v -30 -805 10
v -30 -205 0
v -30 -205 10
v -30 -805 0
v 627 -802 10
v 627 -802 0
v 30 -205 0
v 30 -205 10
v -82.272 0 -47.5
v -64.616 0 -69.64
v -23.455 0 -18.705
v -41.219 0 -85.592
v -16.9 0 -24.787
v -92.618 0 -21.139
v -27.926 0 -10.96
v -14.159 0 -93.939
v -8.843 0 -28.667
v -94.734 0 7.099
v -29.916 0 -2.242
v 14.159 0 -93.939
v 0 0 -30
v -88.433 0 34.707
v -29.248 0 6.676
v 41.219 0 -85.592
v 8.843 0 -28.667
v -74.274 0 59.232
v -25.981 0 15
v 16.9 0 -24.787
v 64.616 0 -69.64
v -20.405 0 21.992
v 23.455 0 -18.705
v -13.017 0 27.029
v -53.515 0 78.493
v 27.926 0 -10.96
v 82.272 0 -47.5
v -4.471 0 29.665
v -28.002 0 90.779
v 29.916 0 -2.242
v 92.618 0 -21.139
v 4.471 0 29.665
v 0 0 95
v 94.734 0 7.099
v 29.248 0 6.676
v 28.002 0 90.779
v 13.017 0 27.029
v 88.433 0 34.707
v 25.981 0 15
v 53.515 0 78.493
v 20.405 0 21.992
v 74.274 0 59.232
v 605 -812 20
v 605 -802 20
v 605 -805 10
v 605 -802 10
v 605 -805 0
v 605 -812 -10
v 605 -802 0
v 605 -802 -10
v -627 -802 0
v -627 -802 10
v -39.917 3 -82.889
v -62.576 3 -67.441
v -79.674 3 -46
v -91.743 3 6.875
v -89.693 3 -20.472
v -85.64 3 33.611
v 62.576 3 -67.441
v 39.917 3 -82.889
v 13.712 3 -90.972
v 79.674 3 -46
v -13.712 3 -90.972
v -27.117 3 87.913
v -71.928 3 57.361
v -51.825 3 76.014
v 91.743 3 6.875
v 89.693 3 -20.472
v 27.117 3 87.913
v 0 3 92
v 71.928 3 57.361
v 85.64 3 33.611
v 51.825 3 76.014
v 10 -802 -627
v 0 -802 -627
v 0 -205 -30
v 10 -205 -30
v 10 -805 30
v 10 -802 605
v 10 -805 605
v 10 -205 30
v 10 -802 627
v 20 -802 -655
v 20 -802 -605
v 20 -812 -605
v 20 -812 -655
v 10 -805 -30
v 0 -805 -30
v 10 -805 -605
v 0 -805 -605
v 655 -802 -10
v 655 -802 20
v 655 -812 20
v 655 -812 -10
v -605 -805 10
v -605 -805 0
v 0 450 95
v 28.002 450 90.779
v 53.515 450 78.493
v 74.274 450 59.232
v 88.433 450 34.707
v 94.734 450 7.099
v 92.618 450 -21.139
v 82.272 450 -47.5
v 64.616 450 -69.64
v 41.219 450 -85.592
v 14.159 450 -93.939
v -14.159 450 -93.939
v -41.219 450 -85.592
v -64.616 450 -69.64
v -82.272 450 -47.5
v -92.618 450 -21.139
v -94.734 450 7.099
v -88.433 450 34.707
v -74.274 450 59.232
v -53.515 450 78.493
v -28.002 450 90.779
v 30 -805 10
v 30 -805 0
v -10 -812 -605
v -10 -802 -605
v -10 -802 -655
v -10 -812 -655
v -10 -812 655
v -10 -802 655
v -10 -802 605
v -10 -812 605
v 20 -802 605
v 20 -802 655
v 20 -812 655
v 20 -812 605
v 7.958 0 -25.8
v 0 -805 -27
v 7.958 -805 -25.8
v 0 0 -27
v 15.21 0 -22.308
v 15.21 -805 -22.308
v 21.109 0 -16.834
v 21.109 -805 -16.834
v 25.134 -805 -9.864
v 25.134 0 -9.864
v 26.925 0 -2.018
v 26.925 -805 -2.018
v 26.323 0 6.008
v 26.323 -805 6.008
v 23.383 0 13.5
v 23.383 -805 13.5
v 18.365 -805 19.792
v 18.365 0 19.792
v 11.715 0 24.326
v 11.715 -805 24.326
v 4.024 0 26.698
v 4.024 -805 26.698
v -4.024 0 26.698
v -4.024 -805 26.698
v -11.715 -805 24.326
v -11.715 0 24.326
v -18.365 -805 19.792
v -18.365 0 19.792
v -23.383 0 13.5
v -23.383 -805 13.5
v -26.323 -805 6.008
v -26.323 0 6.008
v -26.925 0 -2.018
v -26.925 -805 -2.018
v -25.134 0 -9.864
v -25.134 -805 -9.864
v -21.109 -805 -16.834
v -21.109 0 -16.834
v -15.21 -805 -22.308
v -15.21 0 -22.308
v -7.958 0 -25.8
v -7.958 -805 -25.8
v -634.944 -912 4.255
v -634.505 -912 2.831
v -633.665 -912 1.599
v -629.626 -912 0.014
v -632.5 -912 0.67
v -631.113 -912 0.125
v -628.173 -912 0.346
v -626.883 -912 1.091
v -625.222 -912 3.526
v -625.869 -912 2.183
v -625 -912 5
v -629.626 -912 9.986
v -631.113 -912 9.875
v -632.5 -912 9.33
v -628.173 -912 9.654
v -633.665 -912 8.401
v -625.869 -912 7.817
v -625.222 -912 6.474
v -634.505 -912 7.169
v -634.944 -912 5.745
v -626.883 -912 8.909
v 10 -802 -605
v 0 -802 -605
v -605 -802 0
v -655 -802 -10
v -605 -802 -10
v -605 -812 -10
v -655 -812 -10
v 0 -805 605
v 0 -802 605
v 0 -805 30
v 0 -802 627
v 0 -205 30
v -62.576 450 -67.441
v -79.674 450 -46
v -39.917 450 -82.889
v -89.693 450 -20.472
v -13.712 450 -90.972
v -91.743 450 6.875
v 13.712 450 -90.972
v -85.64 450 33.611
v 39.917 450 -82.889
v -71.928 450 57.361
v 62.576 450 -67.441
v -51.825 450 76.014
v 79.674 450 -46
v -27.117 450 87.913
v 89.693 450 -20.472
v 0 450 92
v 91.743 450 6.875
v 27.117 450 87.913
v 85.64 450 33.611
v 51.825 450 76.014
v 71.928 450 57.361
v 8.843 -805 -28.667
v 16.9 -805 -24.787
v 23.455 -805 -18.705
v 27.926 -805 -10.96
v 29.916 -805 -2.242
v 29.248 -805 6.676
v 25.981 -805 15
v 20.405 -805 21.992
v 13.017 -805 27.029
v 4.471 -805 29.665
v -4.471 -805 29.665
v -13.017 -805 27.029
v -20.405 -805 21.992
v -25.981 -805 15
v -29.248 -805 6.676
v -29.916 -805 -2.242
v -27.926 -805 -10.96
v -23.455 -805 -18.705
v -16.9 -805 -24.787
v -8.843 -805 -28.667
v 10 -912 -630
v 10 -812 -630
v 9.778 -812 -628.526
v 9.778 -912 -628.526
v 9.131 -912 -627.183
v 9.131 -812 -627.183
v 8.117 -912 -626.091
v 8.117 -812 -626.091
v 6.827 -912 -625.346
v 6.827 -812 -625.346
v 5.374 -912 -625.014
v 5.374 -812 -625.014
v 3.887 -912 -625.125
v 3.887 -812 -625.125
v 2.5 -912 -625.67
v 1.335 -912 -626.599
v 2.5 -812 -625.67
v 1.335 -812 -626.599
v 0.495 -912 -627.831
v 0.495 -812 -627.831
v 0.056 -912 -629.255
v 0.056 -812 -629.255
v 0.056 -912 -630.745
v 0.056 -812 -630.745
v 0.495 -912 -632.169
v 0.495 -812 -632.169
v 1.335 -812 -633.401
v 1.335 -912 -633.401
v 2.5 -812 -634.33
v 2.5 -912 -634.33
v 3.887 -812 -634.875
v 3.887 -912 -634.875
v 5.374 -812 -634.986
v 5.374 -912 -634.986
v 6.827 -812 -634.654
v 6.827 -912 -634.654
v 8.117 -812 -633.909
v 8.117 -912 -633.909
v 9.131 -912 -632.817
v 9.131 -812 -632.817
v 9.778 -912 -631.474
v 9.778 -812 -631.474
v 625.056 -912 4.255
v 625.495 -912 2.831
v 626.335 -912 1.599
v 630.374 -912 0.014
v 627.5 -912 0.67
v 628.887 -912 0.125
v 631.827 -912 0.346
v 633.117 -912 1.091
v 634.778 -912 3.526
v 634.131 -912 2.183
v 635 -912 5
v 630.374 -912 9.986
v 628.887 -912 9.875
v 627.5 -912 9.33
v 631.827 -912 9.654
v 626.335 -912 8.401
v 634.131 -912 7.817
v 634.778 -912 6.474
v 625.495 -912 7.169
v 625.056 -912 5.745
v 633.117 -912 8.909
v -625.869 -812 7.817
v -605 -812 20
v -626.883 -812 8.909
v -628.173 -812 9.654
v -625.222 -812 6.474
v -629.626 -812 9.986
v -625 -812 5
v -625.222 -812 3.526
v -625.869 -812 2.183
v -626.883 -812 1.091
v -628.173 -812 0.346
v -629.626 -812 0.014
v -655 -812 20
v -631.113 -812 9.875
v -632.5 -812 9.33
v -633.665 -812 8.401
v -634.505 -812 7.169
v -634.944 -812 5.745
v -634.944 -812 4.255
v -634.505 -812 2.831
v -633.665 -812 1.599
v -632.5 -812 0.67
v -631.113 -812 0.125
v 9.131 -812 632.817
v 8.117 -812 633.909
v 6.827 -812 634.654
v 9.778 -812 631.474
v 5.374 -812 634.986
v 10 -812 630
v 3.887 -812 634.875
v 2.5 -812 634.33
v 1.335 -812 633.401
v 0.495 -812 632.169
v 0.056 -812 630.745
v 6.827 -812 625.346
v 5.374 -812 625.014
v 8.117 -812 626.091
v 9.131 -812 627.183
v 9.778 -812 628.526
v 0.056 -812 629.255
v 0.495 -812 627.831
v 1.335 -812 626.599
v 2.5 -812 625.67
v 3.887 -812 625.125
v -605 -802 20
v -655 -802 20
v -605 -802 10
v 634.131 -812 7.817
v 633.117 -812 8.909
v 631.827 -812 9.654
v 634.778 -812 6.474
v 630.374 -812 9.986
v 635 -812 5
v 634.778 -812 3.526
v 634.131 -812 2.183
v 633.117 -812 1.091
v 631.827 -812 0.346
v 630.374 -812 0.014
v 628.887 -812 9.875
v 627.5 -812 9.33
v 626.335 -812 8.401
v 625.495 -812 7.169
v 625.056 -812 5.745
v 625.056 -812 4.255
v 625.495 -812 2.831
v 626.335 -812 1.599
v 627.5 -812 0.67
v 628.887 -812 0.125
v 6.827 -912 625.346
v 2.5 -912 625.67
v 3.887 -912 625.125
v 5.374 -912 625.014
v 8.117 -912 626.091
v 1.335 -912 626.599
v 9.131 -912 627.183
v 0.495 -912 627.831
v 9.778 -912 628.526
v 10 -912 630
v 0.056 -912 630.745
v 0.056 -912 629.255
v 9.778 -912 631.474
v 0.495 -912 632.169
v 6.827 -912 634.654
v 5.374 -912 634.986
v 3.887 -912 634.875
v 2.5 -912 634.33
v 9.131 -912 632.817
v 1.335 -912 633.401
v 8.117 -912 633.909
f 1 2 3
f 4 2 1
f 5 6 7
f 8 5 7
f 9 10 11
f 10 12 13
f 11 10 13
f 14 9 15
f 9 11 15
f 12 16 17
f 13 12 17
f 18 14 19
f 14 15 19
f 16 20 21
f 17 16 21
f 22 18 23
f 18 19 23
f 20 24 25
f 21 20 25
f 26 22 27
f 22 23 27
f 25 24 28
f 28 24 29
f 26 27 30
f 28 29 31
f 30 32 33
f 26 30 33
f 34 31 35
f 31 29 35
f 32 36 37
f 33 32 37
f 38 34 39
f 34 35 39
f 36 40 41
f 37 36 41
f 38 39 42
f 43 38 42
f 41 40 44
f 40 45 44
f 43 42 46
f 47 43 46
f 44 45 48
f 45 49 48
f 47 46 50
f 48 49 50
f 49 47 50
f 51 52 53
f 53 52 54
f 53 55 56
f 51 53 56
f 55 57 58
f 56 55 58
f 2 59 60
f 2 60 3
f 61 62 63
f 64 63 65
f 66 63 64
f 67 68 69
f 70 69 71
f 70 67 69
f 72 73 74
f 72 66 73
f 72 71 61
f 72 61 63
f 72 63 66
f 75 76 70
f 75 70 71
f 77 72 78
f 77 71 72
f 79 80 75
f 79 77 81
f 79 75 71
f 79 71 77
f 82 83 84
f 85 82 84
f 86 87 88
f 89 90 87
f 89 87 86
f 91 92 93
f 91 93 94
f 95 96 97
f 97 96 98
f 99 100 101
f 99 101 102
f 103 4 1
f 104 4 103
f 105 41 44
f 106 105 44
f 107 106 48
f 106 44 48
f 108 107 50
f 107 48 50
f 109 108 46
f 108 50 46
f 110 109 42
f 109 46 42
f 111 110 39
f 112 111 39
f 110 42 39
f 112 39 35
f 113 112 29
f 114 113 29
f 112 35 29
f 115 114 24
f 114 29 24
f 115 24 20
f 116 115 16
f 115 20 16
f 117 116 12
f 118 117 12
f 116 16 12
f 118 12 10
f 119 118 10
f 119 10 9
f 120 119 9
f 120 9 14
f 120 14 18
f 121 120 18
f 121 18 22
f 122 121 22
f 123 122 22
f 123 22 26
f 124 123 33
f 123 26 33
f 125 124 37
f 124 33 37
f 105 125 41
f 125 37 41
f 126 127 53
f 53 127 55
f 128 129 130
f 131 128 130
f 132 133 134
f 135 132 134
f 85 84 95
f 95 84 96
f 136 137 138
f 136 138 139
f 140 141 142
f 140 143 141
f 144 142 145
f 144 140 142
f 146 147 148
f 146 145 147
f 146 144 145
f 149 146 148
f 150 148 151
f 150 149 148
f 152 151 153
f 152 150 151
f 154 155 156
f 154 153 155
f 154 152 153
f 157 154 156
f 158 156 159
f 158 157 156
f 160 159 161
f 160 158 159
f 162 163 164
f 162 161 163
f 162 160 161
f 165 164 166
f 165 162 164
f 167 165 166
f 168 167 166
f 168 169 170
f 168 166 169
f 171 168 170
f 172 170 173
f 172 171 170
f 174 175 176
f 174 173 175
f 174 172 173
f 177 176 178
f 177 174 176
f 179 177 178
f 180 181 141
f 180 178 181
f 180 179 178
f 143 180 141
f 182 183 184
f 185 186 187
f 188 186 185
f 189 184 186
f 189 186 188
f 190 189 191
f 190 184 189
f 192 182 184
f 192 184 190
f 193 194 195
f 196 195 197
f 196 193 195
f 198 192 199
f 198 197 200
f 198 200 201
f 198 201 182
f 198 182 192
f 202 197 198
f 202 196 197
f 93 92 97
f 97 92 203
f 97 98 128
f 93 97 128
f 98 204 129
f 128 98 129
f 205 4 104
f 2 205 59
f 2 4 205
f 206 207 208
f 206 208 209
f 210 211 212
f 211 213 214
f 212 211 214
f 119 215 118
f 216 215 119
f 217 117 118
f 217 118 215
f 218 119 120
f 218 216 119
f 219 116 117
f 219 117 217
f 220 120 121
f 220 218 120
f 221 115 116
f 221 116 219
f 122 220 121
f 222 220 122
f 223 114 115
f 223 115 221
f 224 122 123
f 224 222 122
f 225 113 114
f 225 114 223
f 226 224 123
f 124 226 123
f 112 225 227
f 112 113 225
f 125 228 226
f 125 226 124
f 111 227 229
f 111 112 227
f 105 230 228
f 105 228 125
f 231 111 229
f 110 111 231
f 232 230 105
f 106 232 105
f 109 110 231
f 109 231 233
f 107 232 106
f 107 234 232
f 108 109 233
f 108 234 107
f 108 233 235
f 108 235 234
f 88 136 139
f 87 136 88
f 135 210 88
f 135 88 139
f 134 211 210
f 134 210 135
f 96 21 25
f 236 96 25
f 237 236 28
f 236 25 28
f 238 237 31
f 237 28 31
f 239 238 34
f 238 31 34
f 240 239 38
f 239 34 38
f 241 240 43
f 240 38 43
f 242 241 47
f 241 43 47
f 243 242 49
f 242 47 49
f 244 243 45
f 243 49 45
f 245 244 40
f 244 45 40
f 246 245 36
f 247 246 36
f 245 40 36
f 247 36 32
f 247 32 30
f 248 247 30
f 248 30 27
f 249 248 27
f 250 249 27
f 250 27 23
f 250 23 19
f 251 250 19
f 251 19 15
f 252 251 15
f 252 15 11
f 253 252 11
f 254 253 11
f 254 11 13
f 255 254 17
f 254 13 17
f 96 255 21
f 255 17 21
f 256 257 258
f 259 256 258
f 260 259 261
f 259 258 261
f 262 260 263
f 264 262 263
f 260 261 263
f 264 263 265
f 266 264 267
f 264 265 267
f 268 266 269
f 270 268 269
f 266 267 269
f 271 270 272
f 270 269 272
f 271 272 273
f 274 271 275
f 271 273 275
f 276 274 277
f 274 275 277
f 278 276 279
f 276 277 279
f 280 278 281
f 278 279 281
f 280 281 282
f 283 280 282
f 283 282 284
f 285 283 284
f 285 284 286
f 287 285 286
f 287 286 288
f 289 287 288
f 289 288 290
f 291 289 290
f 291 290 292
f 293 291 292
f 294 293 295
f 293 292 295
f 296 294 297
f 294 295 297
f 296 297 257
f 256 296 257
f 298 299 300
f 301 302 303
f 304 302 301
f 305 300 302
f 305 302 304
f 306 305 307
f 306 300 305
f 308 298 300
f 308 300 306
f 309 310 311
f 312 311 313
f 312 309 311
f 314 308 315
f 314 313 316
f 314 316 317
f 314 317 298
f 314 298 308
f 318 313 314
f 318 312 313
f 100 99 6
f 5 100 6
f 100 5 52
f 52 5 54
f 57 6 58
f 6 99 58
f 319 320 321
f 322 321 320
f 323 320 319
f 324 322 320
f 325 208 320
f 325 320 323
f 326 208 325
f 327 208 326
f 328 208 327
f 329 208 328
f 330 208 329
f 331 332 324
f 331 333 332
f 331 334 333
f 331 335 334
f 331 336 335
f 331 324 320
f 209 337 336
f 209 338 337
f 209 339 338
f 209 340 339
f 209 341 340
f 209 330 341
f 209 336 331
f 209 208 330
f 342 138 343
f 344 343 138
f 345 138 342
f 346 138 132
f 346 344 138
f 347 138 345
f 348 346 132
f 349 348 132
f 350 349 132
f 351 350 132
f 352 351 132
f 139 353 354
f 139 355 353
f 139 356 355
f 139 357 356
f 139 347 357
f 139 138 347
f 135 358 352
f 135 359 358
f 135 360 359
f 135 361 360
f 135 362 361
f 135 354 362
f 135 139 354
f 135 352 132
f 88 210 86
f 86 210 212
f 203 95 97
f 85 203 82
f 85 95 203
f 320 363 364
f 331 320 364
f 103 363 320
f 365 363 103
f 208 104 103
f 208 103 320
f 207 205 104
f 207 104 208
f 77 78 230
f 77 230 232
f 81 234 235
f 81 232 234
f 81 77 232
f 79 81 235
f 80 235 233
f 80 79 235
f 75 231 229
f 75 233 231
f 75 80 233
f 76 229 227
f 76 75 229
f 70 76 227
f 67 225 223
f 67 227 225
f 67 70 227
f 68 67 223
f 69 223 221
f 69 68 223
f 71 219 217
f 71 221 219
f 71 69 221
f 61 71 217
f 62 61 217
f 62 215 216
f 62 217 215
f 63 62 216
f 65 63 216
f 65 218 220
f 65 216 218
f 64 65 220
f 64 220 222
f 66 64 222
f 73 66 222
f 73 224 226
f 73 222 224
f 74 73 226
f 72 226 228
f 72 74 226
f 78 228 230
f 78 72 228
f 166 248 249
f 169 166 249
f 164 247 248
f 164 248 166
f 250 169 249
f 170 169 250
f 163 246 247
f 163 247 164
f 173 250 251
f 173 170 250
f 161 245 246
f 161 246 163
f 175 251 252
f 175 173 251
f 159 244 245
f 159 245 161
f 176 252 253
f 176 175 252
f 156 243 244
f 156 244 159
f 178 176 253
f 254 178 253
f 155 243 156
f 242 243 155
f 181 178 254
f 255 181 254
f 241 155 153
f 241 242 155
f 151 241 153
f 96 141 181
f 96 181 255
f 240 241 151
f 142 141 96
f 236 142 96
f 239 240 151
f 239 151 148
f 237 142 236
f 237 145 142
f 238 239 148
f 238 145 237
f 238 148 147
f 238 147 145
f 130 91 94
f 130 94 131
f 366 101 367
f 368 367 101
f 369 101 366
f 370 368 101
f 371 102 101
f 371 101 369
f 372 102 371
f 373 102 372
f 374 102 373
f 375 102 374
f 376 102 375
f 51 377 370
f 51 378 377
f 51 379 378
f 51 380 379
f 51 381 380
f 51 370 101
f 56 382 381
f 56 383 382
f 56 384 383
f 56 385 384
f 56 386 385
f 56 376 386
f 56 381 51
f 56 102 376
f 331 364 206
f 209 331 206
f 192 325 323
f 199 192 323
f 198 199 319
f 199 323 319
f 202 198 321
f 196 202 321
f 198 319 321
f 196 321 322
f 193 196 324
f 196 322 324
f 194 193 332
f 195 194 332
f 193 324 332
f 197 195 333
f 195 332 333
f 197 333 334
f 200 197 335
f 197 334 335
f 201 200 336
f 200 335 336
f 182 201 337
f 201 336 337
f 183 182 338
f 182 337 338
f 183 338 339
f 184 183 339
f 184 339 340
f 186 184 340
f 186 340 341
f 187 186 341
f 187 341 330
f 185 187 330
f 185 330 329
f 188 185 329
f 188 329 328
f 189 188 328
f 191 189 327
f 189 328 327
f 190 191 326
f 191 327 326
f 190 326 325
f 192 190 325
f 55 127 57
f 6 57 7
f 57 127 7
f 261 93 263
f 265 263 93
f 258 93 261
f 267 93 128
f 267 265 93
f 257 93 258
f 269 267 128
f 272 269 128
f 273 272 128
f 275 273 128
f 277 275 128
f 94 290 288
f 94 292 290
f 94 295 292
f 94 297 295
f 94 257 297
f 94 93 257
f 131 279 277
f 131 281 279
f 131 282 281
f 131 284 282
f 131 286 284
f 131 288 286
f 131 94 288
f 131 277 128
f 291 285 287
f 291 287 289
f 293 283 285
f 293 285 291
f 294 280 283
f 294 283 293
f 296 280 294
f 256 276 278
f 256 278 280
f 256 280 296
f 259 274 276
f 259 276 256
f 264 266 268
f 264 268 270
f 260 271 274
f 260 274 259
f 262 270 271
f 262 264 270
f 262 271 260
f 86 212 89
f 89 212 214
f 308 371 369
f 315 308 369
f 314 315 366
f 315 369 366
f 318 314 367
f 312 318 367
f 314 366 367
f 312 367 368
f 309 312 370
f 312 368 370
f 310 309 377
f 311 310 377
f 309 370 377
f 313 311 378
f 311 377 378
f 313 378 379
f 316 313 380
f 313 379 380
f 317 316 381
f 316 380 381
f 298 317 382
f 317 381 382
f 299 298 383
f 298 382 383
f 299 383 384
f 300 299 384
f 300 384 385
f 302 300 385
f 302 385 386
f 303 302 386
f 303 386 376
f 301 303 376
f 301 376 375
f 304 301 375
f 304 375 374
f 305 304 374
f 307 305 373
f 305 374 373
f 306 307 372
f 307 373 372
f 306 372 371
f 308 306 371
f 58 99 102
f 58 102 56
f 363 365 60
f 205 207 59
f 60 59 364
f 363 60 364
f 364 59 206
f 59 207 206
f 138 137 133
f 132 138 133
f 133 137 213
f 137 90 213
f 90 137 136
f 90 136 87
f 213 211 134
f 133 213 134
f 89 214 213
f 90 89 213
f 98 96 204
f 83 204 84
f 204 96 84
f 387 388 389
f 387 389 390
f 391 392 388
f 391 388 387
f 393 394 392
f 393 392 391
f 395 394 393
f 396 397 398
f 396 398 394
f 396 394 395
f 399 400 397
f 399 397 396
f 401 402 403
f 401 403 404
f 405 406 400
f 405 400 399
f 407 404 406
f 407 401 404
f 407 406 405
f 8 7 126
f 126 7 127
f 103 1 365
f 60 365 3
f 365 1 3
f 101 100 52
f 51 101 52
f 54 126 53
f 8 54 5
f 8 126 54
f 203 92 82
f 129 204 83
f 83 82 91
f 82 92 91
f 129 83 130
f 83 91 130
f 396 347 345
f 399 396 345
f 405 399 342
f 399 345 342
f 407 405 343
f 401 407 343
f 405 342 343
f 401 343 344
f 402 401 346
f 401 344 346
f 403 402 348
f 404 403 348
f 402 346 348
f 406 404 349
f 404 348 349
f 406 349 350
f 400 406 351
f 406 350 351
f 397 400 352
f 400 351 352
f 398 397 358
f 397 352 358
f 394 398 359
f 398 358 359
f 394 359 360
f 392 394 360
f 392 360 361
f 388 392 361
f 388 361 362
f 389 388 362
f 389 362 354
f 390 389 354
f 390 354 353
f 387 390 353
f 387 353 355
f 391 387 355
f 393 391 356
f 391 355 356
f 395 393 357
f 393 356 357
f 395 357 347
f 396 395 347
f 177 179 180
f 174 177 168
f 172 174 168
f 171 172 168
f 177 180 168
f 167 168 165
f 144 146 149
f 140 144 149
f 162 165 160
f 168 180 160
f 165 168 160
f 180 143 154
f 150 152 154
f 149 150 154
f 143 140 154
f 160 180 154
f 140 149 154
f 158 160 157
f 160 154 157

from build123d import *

# Parameters (mm, degrees)
SKETCH1_R            = 95
BOSS_EXTRUDE1_DEPTH  = 450
SHELL2_T             = -3
SKETCH2_R            = 30
BOSS_EXTRUDE2_DEPTH  = 805
SHELL3_T             = -3
BOSS_EXTRUDE3_DEPTH  = 10
BOSS_EXTRUDE4_DEPTH  = 10
BOSS_EXTRUDE5_DEPTH  = 10
BOSS_EXTRUDE6_DEPTH  = 10
SKETCH11_W           = 30
SKETCH11_H           = 50
BOSS_EXTRUDE7_DEPTH  = 10
SKETCH12_W           = 50
SKETCH12_H           = 30
BOSS_EXTRUDE8_DEPTH  = 10
SKETCH13_W           = 50
SKETCH13_H           = 30
BOSS_EXTRUDE9_DEPTH  = 10
SKETCH14_W           = 30
SKETCH14_H           = 50
BOSS_EXTRUDE10_DEPTH = 10
SKETCH17_R           = 5
BOSS_EXTRUDE11_DEPTH = 100
SKETCH18_R           = 5
BOSS_EXTRUDE12_DEPTH = 100
SKETCH19_R           = 5
BOSS_EXTRUDE13_DEPTH = 100
SKETCH20_R           = 5
BOSS_EXTRUDE14_DEPTH = 100


with BuildPart() as part:
    # Sketch1 → Boss-Extrude1 (new body)
    with BuildSketch(Plane(origin=(0, 0, 0), x_dir=(1, 0, 0), z_dir=(0, 1, 0))):
        with Locations(Location((0, 0, 0), (0, 0, 270))):
            Circle(SKETCH1_R)
    extrude(amount=BOSS_EXTRUDE1_DEPTH)

    # Shell2
    shell2_openings = [part.faces().sort_by_distance(p)[0] for p in [
        (0, 450, 0),
    ]]
    offset(amount=SHELL2_T, openings=shell2_openings, kind=Kind.INTERSECTION)

    # Sketch2 → Boss-Extrude2 (add)
    with BuildSketch(Plane.XZ):
        with Locations(Location((0, 0, 0), (0, 0, 270))):
            Circle(SKETCH2_R)
    extrude(amount=BOSS_EXTRUDE2_DEPTH)

    # Shell3
    shell3_openings = [part.faces().sort_by_distance(p)[0] for p in [
        (0, -805, 0),
    ]]
    offset(amount=SHELL3_T, openings=shell3_openings, kind=Kind.INTERSECTION)


with BuildPart() as body_2:
    # Sketch5 → Boss-Extrude3 (new body)
    with BuildSketch(Plane(origin=(0, 0, 0), x_dir=(0, 0, -1), z_dir=(1, 0, 0))):
        Polygon((-30, -205), (-630, -805), (-30, -805), align=None)
    extrude(amount=BOSS_EXTRUDE3_DEPTH)

    # Sketch14 → Boss-Extrude10 (add)
    with BuildSketch(Plane(origin=(0, -802, 0), x_dir=(-1, 0, 0), z_dir=(0, -1, 0))):
        with Locations((-5, -630)):
            Rectangle(SKETCH14_W, SKETCH14_H)
    extrude(amount=BOSS_EXTRUDE10_DEPTH)

    # Sketch18 → Boss-Extrude12 (add)
    with BuildSketch(Plane.XZ.offset(812)):
        with Locations((5, 630)):
            Circle(SKETCH18_R)
    extrude(amount=BOSS_EXTRUDE12_DEPTH)


with BuildPart() as body_3:
    # Sketch6 → Boss-Extrude4 (new body)
    with BuildSketch(Plane(origin=(0, 0, 0), x_dir=(0, 0, -1), z_dir=(1, 0, 0))):
        Polygon((30, -205), (30, -805), (630, -805), align=None)
    extrude(amount=BOSS_EXTRUDE4_DEPTH)

    # Sketch11 → Boss-Extrude7 (add)
    with BuildSketch(Plane(origin=(0, -802, 0), x_dir=(-1, 0, 0), z_dir=(0, -1, 0))):
        with Locations((-5, 630)):
            Rectangle(SKETCH11_W, SKETCH11_H)
    extrude(amount=BOSS_EXTRUDE7_DEPTH)

    # Sketch20 → Boss-Extrude14 (add)
    with BuildSketch(Plane.XZ.offset(812)):
        with Locations((5, -630)):
            Circle(SKETCH20_R)
    extrude(amount=BOSS_EXTRUDE14_DEPTH)


with BuildPart() as body_4:
    # Sketch8 → Boss-Extrude5 (new body)
    with BuildSketch(Plane.XY):
        Polygon((-30, -205), (-30, -805), (-630, -805), align=None)
    extrude(amount=BOSS_EXTRUDE5_DEPTH)

    # Sketch12 → Boss-Extrude8 (add)
    with BuildSketch(Plane(origin=(0, -802, 0), x_dir=(-1, 0, 0), z_dir=(0, -1, 0))):
        with Locations((630, -5)):
            Rectangle(SKETCH12_W, SKETCH12_H)
    extrude(amount=BOSS_EXTRUDE8_DEPTH)

    # Sketch19 → Boss-Extrude13 (add)
    with BuildSketch(Plane.XZ.offset(812)):
        with Locations((-630, 5)):
            Circle(SKETCH19_R)
    extrude(amount=BOSS_EXTRUDE13_DEPTH)


with BuildPart() as body_5:
    # Sketch9 → Boss-Extrude6 (new body)
    with BuildSketch(Plane.XY):
        Polygon((30, -205), (30, -805), (630, -805), align=None)
    extrude(amount=BOSS_EXTRUDE6_DEPTH)

    # Sketch13 → Boss-Extrude9 (add)
    with BuildSketch(Plane(origin=(0, -802, 0), x_dir=(-1, 0, 0), z_dir=(0, -1, 0))):
        with Locations((-630, -5)):
            Rectangle(SKETCH13_W, SKETCH13_H)
    extrude(amount=BOSS_EXTRUDE9_DEPTH)

    # Sketch17 → Boss-Extrude11 (add)
    with BuildSketch(Plane.XZ.offset(812)):
        with Locations((630, 5)):
            Circle(SKETCH17_R)
    extrude(amount=BOSS_EXTRUDE11_DEPTH)


solid = Compound([part.part, body_2.part, body_3.part, body_4.part, body_5.part])
